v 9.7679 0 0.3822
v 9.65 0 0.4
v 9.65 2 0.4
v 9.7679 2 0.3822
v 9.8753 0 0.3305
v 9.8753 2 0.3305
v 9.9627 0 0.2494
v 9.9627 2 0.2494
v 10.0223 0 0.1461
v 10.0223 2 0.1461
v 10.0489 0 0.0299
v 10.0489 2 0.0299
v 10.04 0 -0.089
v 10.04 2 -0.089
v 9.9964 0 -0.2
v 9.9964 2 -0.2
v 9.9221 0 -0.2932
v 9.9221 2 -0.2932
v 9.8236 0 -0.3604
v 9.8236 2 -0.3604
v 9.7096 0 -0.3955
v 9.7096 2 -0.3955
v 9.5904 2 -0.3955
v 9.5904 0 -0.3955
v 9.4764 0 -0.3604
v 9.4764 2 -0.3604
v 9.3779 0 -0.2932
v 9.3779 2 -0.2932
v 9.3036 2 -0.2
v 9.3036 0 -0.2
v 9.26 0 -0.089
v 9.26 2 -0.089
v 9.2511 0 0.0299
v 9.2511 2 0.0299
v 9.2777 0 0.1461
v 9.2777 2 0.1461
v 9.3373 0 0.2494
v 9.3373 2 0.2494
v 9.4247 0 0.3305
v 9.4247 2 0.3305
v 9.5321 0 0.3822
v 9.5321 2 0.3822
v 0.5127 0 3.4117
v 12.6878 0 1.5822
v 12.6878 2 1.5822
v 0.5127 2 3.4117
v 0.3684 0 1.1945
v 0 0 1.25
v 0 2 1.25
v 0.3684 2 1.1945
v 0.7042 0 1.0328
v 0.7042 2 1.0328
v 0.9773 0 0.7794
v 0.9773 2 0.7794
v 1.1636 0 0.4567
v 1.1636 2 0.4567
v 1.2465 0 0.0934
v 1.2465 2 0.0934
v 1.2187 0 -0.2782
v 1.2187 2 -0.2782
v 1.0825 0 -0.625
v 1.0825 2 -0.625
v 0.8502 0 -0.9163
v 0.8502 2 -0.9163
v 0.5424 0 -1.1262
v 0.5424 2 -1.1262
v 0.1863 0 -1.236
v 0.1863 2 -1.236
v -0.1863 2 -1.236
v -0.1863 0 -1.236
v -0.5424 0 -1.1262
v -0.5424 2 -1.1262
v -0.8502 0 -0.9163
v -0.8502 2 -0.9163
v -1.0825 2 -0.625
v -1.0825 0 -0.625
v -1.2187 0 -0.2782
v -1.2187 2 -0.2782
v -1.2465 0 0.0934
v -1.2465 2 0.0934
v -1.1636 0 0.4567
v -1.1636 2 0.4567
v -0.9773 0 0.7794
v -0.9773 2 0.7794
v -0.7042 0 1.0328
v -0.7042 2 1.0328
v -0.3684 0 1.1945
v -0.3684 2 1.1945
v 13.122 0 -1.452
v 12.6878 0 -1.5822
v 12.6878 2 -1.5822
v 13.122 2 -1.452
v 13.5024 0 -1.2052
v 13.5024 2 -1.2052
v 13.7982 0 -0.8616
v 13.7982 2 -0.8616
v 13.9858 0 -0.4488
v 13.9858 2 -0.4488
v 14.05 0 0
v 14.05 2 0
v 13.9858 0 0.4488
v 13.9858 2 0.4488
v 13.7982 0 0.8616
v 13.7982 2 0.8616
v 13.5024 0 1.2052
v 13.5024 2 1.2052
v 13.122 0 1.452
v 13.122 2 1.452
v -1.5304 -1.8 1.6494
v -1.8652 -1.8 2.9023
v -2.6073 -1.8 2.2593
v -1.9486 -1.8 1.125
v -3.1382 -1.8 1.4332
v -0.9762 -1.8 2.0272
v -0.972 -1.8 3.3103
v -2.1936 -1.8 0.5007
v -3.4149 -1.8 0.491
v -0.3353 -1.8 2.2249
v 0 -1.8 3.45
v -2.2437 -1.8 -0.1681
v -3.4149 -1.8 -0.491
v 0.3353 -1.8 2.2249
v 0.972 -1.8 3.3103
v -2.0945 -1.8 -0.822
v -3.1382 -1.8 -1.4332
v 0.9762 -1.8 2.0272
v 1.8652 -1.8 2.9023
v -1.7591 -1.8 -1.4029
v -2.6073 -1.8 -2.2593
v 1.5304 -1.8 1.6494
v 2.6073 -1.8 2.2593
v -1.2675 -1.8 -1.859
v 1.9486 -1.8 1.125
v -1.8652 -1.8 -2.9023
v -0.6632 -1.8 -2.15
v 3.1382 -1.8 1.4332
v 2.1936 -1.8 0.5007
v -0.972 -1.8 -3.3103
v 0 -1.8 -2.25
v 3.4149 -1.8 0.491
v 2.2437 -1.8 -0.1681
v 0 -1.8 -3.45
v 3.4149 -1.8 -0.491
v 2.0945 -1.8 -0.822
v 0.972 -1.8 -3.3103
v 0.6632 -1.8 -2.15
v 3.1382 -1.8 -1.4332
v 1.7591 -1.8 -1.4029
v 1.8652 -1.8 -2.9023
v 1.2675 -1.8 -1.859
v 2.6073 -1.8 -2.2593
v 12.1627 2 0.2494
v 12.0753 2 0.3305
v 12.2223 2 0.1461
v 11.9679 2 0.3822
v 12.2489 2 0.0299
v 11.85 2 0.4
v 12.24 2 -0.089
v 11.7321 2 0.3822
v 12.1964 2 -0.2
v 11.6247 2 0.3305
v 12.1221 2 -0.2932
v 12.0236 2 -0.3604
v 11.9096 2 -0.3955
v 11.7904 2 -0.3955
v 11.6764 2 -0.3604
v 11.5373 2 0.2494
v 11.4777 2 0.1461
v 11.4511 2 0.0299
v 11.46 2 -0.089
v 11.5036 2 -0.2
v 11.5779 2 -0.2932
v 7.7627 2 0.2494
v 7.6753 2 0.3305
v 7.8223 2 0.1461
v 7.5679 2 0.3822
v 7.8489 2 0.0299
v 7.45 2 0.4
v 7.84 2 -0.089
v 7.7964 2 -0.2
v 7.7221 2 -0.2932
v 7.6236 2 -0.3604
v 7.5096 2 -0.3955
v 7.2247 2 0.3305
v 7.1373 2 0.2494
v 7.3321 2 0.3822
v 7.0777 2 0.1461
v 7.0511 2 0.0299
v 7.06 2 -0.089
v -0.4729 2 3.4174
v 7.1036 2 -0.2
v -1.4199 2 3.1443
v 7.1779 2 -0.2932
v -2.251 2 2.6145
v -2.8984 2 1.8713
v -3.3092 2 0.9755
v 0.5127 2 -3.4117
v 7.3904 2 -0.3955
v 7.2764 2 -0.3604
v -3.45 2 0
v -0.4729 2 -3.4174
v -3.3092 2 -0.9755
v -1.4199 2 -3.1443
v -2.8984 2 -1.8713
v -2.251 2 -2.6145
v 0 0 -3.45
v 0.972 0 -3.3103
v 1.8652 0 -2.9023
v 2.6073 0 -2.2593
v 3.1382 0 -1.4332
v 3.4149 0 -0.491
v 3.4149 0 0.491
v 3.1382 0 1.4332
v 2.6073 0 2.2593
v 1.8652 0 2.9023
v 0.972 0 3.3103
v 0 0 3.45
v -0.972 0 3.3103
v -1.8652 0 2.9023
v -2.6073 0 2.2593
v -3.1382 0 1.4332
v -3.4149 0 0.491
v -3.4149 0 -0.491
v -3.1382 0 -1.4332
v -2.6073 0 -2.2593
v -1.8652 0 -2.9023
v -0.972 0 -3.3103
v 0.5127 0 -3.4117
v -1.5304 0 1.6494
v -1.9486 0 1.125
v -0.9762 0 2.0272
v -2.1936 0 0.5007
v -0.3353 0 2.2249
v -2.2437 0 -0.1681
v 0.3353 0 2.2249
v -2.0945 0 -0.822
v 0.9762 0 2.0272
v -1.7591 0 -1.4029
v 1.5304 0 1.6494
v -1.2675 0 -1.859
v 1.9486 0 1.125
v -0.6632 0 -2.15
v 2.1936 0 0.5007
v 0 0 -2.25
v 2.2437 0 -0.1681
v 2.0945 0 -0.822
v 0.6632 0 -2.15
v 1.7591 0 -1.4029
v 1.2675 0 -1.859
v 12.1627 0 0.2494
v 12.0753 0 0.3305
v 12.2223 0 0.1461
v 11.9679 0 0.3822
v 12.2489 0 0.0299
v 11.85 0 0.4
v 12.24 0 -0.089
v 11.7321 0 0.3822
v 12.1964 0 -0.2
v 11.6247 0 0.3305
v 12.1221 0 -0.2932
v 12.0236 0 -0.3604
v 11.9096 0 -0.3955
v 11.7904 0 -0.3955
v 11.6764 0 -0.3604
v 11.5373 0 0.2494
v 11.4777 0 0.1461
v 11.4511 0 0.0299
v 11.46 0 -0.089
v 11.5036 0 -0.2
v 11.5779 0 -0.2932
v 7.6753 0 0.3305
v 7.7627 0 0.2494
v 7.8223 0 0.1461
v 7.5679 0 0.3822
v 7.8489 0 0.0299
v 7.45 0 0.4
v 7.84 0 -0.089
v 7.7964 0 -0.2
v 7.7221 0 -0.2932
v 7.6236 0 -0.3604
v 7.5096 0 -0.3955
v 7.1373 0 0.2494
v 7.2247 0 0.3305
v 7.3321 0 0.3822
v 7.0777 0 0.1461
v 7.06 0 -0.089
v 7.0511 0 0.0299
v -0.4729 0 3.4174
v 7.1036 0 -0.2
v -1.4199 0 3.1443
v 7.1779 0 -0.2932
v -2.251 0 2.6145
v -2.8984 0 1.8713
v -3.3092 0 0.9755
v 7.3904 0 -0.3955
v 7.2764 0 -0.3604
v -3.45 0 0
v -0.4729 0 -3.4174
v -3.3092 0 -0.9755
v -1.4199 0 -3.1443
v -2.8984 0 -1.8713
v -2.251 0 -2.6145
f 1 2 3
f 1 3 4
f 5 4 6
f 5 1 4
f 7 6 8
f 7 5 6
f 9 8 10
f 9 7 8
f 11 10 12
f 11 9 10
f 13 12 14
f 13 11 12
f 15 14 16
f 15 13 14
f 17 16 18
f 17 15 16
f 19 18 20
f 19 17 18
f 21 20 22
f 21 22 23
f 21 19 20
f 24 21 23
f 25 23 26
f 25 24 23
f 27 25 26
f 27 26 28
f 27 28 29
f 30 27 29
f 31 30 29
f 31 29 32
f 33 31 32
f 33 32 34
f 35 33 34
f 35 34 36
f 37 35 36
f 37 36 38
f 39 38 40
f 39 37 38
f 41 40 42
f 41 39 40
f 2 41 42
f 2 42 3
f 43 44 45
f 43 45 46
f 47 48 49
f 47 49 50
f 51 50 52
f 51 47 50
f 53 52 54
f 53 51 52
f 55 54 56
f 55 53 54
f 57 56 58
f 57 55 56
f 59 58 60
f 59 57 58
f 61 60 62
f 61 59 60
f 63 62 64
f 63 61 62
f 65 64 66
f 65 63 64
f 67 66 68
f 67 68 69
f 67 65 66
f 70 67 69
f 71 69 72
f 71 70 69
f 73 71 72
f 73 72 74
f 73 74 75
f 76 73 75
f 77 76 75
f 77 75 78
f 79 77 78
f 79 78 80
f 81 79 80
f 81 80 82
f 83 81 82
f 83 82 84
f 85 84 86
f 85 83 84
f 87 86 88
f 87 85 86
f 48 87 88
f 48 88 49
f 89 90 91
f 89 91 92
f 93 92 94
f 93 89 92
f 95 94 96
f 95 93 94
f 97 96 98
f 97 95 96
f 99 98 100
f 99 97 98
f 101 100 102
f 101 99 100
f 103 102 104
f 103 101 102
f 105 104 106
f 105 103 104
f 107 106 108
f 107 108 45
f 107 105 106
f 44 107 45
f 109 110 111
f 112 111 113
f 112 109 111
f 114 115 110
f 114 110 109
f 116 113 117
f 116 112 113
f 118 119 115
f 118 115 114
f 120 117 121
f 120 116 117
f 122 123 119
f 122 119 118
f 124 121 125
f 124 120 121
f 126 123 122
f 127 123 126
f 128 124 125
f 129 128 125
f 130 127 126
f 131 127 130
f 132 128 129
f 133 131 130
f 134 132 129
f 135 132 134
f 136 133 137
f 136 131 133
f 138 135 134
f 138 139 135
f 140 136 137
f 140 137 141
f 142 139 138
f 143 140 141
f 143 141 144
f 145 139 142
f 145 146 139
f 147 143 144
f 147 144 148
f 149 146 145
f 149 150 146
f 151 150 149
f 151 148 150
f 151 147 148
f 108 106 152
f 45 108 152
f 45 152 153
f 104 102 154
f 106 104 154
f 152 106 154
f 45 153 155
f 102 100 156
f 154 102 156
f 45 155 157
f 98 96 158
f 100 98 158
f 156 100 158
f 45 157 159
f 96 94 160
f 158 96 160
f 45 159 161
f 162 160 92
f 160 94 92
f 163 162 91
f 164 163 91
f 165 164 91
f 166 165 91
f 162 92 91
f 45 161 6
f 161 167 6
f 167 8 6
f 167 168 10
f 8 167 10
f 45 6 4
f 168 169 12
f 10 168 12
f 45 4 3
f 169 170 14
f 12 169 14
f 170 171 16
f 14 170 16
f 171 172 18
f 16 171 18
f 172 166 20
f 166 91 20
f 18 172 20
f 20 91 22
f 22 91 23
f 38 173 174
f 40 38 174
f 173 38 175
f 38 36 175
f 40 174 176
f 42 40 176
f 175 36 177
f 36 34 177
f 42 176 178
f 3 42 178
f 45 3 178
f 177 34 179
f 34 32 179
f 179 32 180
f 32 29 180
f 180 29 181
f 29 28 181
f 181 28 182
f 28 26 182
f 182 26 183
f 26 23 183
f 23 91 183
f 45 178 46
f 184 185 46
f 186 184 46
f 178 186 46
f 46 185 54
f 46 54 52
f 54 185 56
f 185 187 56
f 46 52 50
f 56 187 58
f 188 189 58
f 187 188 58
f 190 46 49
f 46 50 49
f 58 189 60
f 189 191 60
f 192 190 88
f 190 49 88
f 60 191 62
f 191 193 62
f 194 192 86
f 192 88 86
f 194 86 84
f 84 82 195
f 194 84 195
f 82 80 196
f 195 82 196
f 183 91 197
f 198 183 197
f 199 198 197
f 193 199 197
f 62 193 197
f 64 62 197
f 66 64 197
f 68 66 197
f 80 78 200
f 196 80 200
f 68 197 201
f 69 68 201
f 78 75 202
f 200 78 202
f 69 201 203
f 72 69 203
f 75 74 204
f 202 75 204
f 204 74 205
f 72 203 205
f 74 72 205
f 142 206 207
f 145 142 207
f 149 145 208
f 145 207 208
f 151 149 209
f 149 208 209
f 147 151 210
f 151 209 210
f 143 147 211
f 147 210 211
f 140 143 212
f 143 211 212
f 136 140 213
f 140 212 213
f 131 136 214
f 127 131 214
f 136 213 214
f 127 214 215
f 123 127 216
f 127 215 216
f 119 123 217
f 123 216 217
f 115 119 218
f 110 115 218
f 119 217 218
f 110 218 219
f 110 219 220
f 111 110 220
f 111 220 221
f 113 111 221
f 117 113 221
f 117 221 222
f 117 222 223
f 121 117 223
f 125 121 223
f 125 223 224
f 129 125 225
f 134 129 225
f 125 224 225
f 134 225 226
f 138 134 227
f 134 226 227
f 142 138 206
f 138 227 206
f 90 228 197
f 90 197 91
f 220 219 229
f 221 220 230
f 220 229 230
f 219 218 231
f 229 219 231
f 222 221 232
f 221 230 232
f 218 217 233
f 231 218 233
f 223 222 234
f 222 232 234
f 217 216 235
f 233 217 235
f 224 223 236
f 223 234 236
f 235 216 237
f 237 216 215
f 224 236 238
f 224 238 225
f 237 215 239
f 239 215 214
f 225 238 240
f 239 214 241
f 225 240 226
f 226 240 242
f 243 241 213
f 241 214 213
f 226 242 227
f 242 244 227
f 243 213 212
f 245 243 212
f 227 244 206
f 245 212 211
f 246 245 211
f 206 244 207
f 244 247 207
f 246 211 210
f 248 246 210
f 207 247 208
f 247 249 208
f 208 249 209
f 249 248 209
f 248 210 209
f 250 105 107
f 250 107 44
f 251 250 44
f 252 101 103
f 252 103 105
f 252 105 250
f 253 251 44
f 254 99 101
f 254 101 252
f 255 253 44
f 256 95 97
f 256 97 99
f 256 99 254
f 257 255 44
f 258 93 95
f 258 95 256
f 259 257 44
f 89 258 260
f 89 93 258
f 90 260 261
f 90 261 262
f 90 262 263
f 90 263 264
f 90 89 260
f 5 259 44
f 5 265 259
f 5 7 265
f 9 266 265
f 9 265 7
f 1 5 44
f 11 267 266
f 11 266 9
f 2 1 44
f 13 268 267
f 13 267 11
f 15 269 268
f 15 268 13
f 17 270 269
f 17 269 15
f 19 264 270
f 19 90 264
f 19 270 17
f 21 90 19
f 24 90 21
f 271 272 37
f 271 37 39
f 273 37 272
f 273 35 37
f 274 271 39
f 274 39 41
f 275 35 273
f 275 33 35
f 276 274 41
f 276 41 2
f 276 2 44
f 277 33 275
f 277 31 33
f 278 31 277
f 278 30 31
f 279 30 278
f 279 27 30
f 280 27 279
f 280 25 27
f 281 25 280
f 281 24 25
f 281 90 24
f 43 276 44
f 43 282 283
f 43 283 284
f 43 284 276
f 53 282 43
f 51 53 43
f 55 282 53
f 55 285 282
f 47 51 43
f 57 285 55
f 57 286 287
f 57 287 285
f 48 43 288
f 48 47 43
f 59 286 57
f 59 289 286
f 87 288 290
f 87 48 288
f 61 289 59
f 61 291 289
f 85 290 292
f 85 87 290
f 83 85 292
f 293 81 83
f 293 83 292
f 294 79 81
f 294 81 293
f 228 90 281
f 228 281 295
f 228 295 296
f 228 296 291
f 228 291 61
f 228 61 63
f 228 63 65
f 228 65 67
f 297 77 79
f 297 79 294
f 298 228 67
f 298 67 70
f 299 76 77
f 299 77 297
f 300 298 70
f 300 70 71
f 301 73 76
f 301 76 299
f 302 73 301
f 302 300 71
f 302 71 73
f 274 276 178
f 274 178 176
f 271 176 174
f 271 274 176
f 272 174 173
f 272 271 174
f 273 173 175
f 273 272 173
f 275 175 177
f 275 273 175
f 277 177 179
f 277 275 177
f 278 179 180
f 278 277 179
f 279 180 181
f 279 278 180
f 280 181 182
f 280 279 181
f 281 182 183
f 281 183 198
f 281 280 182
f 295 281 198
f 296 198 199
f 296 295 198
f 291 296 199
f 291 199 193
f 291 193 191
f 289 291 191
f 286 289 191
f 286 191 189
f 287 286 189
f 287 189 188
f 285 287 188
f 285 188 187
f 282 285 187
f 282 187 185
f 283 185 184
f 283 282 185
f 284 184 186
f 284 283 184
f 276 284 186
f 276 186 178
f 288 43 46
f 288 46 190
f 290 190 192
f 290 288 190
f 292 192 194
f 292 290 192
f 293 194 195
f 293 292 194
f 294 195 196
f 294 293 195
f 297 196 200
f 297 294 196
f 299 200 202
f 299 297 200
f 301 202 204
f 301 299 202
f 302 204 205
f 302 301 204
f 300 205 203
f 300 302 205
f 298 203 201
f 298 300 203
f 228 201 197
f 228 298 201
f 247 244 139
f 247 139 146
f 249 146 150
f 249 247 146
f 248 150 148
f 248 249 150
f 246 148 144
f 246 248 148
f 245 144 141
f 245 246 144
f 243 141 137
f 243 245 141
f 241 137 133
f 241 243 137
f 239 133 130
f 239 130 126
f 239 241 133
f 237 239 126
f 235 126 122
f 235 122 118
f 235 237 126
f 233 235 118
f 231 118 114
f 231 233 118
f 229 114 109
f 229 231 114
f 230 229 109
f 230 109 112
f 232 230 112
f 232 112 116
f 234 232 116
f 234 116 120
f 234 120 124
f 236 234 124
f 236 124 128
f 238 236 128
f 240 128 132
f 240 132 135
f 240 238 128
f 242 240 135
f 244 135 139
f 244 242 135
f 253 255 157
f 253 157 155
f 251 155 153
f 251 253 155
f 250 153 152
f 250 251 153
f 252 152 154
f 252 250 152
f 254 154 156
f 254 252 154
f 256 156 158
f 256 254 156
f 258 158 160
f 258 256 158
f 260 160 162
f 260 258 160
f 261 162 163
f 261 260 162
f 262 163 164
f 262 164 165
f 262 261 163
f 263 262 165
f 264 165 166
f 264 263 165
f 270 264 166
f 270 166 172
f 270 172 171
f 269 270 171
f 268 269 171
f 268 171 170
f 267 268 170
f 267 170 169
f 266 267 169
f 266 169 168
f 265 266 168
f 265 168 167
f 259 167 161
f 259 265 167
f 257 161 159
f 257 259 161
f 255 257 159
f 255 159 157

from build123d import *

# Parameters (mm, degrees)
SKETCH1_R           = 0.4
SKETCH1_R_2         = 1.25
BOSS_EXTRUDE1_DEPTH = 2
SKETCH2_R           = 3.45
SKETCH2_R_2         = 2.25
BOSS_EXTRUDE2_DEPTH = 1.8


with BuildPart() as part:
    # Sketch1 → Boss-Extrude1 (new body)
    with BuildSketch(Plane(origin=(0, 0, 0), x_dir=(1, 0, 0), z_dir=(0, 1, 0))):
        with BuildLine():
            Line((0.512650602, 3.411698896), (12.687751004, 1.582237169))
            ThreePointArc((12.687751004, 1.582237169), (14.05, 0), (12.687751004, -1.582237169))
            Line((12.687751004, -1.582237169), (0.512650602, -3.411698896))
            ThreePointArc((0.512650602, -3.411698896), (-3.45, 0), (0.512650602, 3.411698896))
        make_face()
        with Locations(Location((7.45, 0, 0), (0, 0, 270))):
            Circle(SKETCH1_R, mode=Mode.SUBTRACT)
        with Locations(Location((9.65, 0, 0), (0, 0, 270))):
            Circle(SKETCH1_R, mode=Mode.SUBTRACT)
        with Locations(Location((11.85, 0, 0), (0, 0, 270))):
            Circle(SKETCH1_R, mode=Mode.SUBTRACT)
        with Locations(Location((0, 0, 0), (0, 0, 270))):
            Circle(SKETCH1_R_2, mode=Mode.SUBTRACT)
    extrude(amount=BOSS_EXTRUDE1_DEPTH)


with BuildPart() as body_2:
    # Sketch2 → Boss-Extrude2 (new body)
    with BuildSketch(Plane.XZ):
        with Locations(Location((0, 0, 0), (0, 0, 270))):
            Circle(SKETCH2_R)
        with Locations(Location((0, 0, 0), (0, 0, 270))):
            Circle(SKETCH2_R_2, mode=Mode.SUBTRACT)
    extrude(amount=BOSS_EXTRUDE2_DEPTH)


solid = Compound([part.part, body_2.part])
